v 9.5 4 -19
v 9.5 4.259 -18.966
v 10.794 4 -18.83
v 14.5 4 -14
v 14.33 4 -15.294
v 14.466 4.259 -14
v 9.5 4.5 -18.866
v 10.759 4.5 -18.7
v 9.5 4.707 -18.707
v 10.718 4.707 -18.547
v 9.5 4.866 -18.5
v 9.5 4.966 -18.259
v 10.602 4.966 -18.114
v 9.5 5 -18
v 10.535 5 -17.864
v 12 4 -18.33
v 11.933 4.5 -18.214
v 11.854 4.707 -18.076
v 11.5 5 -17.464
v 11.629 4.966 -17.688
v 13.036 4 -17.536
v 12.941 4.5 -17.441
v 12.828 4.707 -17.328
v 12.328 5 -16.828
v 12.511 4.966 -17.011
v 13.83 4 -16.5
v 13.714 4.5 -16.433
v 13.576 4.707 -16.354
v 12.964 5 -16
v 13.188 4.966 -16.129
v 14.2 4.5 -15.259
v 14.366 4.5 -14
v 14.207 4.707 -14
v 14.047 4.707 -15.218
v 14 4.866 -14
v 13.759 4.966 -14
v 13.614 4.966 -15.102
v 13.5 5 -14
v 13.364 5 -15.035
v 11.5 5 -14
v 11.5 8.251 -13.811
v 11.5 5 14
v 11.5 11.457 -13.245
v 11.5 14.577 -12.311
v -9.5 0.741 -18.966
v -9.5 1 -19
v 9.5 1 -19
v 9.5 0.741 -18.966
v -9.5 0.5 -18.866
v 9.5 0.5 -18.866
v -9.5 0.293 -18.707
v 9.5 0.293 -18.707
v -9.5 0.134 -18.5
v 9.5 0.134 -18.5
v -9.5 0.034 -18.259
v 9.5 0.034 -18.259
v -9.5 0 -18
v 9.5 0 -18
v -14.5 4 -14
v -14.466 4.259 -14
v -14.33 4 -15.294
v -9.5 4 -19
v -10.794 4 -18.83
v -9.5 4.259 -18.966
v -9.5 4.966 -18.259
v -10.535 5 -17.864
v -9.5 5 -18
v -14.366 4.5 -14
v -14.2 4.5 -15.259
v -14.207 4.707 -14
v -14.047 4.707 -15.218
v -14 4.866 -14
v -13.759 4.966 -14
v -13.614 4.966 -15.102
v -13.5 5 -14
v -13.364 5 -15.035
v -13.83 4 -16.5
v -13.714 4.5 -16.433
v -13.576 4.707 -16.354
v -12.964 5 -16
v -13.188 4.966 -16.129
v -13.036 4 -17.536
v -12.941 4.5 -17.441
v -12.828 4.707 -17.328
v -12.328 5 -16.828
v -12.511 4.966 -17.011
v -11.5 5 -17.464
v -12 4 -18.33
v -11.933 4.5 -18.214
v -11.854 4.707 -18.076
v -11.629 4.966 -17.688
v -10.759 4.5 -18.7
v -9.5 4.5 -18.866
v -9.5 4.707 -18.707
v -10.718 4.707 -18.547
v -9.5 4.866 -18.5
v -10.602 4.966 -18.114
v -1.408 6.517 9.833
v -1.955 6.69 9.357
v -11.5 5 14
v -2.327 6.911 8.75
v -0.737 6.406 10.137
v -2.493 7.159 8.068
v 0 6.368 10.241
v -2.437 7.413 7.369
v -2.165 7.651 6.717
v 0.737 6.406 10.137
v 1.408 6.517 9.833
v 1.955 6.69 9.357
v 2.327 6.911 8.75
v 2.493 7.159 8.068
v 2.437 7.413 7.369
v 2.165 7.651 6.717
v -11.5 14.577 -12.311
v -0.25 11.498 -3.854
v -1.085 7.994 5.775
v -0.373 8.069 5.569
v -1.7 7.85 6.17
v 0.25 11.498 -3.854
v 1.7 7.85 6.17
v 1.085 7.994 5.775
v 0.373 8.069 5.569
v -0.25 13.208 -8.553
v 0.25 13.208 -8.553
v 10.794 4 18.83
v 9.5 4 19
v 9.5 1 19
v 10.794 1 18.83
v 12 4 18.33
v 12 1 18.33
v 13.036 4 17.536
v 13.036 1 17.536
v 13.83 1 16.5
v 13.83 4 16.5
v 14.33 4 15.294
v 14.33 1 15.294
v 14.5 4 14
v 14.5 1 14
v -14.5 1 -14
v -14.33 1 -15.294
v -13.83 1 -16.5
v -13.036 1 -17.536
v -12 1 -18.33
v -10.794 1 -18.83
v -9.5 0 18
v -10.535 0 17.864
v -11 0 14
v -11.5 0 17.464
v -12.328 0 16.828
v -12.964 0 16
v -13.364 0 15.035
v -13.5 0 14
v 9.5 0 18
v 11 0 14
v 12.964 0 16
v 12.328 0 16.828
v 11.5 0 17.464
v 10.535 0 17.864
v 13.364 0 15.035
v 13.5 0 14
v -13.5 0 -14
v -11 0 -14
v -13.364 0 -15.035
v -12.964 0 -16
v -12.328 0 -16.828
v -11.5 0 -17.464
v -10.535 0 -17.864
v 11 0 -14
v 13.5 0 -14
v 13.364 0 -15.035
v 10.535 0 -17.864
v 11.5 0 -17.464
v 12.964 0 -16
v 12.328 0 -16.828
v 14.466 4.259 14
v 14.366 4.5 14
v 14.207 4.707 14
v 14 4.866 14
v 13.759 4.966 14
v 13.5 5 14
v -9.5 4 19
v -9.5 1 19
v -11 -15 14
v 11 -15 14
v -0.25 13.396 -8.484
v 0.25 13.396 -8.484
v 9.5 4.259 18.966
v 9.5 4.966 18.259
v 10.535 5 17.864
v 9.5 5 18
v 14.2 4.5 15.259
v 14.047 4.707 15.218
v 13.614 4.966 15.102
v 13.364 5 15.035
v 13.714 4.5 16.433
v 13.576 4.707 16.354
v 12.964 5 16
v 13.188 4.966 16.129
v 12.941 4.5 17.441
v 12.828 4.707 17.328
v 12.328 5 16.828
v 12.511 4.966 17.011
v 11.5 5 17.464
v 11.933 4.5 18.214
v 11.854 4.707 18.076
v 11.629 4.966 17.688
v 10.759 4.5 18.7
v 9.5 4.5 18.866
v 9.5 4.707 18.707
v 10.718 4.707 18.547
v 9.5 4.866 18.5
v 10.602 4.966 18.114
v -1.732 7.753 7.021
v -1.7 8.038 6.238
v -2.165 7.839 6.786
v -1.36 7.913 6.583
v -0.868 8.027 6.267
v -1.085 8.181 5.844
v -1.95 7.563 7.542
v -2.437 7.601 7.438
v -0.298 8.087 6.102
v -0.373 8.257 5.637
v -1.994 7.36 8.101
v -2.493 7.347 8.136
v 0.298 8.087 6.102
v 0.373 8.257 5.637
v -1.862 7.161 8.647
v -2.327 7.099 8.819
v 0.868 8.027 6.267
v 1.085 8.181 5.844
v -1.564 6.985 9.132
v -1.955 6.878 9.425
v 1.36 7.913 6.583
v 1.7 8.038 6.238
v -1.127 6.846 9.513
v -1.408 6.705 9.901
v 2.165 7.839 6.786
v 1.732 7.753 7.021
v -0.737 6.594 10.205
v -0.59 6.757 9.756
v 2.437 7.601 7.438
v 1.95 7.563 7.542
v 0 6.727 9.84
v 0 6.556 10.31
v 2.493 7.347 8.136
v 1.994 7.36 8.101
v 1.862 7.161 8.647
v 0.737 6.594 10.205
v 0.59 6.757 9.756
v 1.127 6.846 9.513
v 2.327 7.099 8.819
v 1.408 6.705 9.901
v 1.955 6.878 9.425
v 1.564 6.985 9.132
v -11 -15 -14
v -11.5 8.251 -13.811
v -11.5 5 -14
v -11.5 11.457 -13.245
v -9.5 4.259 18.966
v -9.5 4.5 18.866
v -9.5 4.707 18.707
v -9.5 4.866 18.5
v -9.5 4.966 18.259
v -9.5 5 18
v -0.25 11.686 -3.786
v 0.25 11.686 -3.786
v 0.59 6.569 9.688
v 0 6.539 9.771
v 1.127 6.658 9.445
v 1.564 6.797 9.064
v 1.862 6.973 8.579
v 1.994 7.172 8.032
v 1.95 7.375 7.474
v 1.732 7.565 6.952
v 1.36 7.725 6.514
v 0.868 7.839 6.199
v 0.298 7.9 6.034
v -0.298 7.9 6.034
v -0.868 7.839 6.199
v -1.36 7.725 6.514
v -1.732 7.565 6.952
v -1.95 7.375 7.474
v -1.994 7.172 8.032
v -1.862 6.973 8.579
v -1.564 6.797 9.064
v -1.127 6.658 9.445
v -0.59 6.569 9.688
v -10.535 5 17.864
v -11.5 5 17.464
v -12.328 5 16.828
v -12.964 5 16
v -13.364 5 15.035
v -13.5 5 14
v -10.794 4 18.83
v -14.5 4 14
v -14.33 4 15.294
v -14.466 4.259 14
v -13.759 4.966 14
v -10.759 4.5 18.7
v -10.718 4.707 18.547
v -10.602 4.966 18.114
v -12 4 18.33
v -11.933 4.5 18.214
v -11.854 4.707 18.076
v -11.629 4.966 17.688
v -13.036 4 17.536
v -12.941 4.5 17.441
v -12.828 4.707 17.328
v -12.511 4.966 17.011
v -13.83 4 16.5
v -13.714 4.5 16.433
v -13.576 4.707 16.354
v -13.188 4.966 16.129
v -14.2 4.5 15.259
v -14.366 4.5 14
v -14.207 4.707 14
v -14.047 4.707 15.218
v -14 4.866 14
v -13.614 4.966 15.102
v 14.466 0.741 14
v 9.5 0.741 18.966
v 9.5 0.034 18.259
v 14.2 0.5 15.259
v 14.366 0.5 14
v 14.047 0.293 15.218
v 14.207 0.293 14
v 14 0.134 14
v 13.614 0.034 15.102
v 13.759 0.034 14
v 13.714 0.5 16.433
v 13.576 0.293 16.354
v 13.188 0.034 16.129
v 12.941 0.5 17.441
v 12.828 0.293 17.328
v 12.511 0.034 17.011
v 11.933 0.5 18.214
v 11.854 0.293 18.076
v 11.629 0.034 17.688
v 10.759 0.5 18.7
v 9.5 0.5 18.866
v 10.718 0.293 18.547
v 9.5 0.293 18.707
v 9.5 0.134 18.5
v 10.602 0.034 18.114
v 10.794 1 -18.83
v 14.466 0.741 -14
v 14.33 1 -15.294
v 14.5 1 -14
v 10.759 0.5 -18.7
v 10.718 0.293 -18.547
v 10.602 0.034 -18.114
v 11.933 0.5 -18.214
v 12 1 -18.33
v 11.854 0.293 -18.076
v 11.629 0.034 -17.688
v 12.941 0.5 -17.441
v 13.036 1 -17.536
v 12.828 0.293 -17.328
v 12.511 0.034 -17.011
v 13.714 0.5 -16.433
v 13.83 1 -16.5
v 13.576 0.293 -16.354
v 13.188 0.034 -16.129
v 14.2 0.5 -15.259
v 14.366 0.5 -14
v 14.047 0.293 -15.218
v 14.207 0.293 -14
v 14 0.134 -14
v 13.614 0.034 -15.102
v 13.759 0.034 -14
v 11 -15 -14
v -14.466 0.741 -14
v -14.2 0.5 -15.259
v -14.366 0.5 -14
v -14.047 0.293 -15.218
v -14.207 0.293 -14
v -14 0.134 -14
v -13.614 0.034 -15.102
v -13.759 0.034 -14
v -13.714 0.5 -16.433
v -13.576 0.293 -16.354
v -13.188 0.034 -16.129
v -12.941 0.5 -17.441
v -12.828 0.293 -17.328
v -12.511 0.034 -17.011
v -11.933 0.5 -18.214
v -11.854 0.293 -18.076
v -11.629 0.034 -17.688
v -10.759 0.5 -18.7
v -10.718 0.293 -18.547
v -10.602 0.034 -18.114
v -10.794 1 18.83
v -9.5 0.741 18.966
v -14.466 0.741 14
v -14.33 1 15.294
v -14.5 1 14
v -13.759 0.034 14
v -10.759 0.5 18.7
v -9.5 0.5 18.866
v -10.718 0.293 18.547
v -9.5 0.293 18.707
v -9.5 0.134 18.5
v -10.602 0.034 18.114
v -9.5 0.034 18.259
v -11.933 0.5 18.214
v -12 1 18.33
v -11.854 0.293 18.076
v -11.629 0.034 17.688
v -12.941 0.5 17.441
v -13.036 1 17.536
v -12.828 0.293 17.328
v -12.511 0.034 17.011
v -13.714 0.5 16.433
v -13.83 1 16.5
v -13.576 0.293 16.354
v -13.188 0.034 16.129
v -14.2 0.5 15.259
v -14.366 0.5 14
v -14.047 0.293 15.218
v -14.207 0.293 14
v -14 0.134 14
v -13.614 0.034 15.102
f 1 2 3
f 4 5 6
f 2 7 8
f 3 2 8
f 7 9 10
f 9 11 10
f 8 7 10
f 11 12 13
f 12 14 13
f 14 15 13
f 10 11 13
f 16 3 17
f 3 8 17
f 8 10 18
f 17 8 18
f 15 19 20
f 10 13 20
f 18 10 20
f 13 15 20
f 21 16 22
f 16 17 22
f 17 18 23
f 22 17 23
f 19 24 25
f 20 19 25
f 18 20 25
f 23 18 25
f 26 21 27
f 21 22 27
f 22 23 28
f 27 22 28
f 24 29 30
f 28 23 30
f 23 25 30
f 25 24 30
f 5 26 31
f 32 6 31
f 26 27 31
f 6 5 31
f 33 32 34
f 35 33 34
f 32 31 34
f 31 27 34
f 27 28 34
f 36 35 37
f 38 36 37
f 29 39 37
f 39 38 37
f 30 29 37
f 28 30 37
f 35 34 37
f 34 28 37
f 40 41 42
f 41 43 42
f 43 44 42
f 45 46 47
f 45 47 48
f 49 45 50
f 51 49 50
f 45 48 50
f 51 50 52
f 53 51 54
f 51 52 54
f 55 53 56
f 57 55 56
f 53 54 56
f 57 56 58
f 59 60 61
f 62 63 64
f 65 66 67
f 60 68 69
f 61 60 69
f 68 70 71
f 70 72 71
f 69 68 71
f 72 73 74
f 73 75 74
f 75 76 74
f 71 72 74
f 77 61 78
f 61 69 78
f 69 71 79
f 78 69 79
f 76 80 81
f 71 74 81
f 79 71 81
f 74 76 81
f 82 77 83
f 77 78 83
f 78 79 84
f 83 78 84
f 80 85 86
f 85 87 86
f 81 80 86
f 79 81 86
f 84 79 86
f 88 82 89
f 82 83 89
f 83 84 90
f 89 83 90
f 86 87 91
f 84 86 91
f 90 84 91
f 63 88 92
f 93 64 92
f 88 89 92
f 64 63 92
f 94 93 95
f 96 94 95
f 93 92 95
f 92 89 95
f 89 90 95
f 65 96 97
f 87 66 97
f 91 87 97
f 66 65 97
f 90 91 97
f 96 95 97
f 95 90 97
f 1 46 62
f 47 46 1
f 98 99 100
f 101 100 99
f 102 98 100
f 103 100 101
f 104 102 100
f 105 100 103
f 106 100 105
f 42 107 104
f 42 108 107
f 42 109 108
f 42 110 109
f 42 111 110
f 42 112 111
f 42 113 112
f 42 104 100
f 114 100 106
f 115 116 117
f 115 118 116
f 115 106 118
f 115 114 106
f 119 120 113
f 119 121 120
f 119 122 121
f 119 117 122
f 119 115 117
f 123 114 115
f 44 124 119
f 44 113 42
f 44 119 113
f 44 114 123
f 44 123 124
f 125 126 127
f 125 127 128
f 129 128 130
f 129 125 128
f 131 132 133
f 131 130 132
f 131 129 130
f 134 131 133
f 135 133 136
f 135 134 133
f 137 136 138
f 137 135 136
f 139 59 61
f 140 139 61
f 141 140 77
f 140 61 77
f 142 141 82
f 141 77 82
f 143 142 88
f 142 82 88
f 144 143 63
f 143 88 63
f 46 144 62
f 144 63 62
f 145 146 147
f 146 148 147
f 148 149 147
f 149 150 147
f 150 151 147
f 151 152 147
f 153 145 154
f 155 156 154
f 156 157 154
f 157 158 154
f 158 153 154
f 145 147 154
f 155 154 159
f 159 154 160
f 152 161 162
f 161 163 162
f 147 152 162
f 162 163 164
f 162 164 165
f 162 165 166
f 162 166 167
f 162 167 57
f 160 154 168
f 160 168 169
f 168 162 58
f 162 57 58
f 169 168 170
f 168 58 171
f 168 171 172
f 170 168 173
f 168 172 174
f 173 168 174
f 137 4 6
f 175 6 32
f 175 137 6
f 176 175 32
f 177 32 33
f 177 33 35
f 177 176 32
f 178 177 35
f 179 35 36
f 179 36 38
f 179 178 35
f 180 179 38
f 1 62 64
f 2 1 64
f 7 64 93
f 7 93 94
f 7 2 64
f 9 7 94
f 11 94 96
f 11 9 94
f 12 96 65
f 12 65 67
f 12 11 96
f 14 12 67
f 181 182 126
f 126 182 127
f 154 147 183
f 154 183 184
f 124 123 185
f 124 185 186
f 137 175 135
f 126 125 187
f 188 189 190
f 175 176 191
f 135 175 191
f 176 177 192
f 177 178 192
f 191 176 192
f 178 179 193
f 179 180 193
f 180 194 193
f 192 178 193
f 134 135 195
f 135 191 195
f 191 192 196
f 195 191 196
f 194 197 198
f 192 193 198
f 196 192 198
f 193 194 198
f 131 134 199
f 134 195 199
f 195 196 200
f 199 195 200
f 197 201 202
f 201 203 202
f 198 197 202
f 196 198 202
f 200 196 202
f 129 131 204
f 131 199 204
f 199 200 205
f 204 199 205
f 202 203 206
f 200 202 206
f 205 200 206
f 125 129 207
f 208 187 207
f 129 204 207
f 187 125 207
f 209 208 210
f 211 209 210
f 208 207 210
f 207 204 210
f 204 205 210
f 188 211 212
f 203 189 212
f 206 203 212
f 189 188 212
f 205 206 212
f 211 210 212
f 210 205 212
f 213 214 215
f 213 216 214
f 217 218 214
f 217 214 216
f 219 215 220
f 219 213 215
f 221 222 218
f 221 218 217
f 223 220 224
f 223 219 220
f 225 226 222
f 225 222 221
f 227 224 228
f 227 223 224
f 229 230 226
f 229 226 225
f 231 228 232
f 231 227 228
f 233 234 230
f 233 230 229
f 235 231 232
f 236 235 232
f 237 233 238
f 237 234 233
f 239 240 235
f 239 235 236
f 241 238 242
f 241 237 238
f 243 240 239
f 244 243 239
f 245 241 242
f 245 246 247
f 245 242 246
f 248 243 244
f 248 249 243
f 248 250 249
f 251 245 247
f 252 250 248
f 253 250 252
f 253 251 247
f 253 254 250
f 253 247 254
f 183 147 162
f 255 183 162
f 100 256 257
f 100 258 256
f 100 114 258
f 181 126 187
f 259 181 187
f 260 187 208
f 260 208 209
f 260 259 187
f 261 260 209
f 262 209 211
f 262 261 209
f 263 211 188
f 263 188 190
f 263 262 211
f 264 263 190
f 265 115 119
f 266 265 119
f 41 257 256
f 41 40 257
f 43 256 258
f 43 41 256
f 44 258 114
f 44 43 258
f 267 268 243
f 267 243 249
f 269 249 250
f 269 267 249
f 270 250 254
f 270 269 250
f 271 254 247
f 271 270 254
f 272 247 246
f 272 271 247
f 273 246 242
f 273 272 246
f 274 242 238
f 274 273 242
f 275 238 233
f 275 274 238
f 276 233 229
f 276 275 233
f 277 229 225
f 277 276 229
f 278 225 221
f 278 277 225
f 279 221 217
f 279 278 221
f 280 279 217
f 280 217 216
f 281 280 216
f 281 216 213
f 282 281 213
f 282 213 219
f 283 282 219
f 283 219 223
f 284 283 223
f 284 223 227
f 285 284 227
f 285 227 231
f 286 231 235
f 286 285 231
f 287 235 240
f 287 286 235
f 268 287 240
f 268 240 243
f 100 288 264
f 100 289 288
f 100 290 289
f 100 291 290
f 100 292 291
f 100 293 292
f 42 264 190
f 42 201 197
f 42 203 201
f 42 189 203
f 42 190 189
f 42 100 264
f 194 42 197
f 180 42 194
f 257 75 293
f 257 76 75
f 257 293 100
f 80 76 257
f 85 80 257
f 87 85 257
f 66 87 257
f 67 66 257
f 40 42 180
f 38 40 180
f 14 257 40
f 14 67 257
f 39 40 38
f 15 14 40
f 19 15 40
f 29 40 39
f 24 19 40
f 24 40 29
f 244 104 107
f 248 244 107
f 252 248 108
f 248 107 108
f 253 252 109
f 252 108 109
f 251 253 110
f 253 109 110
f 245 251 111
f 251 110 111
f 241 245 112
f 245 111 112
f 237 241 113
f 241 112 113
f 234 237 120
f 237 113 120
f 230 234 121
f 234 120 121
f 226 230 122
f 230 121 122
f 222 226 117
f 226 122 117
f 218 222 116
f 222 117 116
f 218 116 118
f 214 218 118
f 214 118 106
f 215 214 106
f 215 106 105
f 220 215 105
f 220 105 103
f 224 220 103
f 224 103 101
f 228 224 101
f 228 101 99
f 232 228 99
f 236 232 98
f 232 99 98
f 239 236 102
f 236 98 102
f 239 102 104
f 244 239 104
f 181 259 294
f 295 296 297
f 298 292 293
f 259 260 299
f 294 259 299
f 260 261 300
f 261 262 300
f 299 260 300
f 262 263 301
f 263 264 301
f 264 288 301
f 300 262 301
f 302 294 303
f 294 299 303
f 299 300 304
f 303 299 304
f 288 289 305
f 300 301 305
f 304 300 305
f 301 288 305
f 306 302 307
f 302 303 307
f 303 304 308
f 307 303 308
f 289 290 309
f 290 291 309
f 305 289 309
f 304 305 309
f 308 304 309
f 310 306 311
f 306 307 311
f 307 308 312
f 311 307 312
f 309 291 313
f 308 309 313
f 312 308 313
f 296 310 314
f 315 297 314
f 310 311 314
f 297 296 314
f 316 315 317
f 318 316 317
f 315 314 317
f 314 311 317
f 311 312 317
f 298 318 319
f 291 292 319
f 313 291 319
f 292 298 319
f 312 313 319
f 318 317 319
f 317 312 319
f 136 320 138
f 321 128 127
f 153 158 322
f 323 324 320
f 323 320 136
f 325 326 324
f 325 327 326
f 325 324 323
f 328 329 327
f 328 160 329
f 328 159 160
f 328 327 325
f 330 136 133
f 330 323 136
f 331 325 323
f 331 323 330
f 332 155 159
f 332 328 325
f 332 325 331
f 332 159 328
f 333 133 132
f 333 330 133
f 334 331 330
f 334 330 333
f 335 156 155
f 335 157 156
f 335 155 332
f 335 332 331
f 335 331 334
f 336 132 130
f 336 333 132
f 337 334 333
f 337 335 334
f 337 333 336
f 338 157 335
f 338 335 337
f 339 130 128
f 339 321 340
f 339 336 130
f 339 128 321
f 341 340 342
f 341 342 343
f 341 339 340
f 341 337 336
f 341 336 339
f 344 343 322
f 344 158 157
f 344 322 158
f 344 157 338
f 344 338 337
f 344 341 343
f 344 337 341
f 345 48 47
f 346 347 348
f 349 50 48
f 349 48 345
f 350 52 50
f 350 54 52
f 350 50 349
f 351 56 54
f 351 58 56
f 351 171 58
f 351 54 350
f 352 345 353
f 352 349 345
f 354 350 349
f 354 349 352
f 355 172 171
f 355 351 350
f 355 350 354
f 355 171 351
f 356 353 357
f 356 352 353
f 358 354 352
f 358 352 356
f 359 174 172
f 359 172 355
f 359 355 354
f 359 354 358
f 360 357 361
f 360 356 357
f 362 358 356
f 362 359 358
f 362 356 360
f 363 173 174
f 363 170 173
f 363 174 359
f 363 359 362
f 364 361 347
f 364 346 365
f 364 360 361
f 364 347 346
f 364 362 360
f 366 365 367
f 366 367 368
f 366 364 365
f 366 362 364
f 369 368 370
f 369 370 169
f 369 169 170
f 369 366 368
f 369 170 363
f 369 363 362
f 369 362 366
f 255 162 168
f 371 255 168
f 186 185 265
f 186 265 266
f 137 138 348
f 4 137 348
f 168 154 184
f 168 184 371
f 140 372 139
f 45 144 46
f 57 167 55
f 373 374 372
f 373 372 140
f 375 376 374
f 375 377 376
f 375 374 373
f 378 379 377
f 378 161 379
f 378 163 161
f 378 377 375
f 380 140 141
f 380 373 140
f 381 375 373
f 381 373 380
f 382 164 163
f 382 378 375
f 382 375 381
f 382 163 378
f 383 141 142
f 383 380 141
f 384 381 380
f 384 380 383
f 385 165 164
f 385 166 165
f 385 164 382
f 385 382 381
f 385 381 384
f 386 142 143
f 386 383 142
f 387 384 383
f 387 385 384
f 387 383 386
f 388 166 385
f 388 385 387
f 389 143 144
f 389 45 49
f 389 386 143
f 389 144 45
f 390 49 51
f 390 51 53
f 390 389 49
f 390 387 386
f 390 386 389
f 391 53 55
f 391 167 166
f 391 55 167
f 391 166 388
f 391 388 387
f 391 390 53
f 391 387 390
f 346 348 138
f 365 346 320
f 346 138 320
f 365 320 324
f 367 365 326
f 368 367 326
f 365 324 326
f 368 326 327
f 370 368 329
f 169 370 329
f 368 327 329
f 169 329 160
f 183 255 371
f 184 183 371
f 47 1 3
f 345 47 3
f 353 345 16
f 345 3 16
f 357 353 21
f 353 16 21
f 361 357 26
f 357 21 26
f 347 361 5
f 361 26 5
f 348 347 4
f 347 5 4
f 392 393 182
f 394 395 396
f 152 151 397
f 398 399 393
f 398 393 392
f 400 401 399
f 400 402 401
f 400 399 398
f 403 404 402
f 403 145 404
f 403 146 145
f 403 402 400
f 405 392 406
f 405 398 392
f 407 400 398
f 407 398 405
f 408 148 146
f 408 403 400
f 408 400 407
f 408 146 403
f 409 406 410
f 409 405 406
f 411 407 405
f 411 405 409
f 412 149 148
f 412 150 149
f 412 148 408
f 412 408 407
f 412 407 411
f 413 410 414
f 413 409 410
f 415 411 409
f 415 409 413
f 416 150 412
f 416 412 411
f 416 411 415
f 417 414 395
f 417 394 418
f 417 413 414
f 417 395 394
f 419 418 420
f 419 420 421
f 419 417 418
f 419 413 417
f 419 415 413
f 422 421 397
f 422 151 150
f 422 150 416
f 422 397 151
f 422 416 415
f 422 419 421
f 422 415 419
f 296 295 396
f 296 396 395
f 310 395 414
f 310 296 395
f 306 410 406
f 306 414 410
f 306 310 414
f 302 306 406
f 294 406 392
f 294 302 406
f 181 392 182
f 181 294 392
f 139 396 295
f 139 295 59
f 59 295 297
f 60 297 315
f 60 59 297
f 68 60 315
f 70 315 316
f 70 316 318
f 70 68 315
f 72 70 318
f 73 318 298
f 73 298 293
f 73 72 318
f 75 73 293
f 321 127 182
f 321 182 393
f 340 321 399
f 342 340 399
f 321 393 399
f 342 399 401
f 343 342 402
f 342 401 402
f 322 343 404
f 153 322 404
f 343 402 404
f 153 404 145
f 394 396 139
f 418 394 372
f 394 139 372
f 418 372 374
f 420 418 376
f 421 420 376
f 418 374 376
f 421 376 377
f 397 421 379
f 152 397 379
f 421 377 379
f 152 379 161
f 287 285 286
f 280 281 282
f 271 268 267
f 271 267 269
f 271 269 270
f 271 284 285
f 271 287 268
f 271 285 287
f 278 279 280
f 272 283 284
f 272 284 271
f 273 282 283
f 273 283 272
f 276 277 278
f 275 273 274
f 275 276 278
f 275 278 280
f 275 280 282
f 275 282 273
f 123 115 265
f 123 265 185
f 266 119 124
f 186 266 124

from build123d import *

# Parameters (mm, degrees)
SKETCH_1_W      = 22
SKETCH_1_H      = 28
EXTRUDE_2_DEPTH = 15
SKETCH_1_5_W    = 29
SKETCH_1_5_H    = 38
EXTRUDE_3_DEPTH = 5
SKETCH_2_W      = 23
SKETCH_2_H      = 28
REVOLVE_1_ANGLE = 20
SKETCH_3_R      = 2.5
SKETCH_3_R_2    = 2
EXTRUDE_4_DEPTH = 0.2
FILLET_1_R      = 5
FILLET_2_R      = 1


with BuildPart() as part:
    # 草图1 → 凸台-拉伸2 (new body)
    with BuildSketch(Plane(origin=(0, 0, 0), x_dir=(1, 0, 0), z_dir=(0, 1, 0))):
        Rectangle(SKETCH_1_W, SKETCH_1_H)
    extrude(amount=-EXTRUDE_2_DEPTH)

    # 草图1<5> → 凸台-拉伸3 (add)
    with BuildSketch(Plane(origin=(0, 0, 0), x_dir=(1, 0, 0), z_dir=(0, 1, 0))):
        Rectangle(SKETCH_1_5_W, SKETCH_1_5_H)
    extrude(amount=EXTRUDE_3_DEPTH)

    # 草图2 → 旋转1 (revolve)
    with BuildSketch(Plane(origin=(0, 5, 0), x_dir=(1, 0, 0), z_dir=(0, 1, 0))):
        Rectangle(SKETCH_2_W, SKETCH_2_H)
    revolve(axis=Axis((-11.5, 5, 14), (1, 0, 0)), revolution_arc=REVOLVE_1_ANGLE)

    # 草图3 → 凸台-拉伸4 (add)
    # profile 1 of 2: a face of its own
    with BuildSketch(Plane(origin=(0, 8.914624376, 3.244657922), x_dir=(1, 0, 0), z_dir=(0, 0.9396926207859082, 0.34202014332566943))):
        with Locations((0, -4.945595974)):
            Circle(SKETCH_3_R)
        with Locations((0, -4.945595974)):
            Circle(SKETCH_3_R_2, mode=Mode.SUBTRACT)
    # profile 2 of 2: a face of its own
    with BuildSketch(Plane(origin=(0, 8.914624376, 3.244657922), x_dir=(1, 0, 0), z_dir=(0, 0.9396926207859082, 0.34202014332566943))):
        Polygon((-0.25, 7.554404026), (0, 7.554404026), (0.25, 7.554404026), (0.25, 12.554404026), (-0.25, 12.554404026), align=None)
    extrude(amount=EXTRUDE_4_DEPTH)

    # 圆角1
    fillet_1_edges = [part.edges().sort_by_distance(p)[0] for p in [
        (-14.5, 2.5, -19),
        (14.5, 2.5, -19),
        (14.5, 2.5, 19),
        (-14.5, 2.5, 19),
    ]]
    fillet(fillet_1_edges, radius=FILLET_1_R)

    # 圆角2
    fillet_2_edges = [part.edges().sort_by_distance(p)[0] for p in [
        (13.035533906, 0, -17.535533906),
        (0, 0, -19),
        (-13.035533906, 0, -17.535533906),
        (-14.5, 0, 0),
        (-13.035533906, 0, 17.535533906),
        (0, 0, 19),
        (13.035533906, 0, 17.535533906),
        (13.035533906, 5, -17.535533906),
        (0, 5, -19),
        (-13.035533906, 5, -17.535533906),
        (-14.5, 5, 0),
        (-13.035533906, 5, 17.535533906),
        (0, 5, 19),
        (13.035533906, 5, 17.535533906),
        (14.5, 0, 0),
        (14.5, 5, 0),
    ]]
    fillet(fillet_2_edges, radius=FILLET_2_R)


solid = part.part
